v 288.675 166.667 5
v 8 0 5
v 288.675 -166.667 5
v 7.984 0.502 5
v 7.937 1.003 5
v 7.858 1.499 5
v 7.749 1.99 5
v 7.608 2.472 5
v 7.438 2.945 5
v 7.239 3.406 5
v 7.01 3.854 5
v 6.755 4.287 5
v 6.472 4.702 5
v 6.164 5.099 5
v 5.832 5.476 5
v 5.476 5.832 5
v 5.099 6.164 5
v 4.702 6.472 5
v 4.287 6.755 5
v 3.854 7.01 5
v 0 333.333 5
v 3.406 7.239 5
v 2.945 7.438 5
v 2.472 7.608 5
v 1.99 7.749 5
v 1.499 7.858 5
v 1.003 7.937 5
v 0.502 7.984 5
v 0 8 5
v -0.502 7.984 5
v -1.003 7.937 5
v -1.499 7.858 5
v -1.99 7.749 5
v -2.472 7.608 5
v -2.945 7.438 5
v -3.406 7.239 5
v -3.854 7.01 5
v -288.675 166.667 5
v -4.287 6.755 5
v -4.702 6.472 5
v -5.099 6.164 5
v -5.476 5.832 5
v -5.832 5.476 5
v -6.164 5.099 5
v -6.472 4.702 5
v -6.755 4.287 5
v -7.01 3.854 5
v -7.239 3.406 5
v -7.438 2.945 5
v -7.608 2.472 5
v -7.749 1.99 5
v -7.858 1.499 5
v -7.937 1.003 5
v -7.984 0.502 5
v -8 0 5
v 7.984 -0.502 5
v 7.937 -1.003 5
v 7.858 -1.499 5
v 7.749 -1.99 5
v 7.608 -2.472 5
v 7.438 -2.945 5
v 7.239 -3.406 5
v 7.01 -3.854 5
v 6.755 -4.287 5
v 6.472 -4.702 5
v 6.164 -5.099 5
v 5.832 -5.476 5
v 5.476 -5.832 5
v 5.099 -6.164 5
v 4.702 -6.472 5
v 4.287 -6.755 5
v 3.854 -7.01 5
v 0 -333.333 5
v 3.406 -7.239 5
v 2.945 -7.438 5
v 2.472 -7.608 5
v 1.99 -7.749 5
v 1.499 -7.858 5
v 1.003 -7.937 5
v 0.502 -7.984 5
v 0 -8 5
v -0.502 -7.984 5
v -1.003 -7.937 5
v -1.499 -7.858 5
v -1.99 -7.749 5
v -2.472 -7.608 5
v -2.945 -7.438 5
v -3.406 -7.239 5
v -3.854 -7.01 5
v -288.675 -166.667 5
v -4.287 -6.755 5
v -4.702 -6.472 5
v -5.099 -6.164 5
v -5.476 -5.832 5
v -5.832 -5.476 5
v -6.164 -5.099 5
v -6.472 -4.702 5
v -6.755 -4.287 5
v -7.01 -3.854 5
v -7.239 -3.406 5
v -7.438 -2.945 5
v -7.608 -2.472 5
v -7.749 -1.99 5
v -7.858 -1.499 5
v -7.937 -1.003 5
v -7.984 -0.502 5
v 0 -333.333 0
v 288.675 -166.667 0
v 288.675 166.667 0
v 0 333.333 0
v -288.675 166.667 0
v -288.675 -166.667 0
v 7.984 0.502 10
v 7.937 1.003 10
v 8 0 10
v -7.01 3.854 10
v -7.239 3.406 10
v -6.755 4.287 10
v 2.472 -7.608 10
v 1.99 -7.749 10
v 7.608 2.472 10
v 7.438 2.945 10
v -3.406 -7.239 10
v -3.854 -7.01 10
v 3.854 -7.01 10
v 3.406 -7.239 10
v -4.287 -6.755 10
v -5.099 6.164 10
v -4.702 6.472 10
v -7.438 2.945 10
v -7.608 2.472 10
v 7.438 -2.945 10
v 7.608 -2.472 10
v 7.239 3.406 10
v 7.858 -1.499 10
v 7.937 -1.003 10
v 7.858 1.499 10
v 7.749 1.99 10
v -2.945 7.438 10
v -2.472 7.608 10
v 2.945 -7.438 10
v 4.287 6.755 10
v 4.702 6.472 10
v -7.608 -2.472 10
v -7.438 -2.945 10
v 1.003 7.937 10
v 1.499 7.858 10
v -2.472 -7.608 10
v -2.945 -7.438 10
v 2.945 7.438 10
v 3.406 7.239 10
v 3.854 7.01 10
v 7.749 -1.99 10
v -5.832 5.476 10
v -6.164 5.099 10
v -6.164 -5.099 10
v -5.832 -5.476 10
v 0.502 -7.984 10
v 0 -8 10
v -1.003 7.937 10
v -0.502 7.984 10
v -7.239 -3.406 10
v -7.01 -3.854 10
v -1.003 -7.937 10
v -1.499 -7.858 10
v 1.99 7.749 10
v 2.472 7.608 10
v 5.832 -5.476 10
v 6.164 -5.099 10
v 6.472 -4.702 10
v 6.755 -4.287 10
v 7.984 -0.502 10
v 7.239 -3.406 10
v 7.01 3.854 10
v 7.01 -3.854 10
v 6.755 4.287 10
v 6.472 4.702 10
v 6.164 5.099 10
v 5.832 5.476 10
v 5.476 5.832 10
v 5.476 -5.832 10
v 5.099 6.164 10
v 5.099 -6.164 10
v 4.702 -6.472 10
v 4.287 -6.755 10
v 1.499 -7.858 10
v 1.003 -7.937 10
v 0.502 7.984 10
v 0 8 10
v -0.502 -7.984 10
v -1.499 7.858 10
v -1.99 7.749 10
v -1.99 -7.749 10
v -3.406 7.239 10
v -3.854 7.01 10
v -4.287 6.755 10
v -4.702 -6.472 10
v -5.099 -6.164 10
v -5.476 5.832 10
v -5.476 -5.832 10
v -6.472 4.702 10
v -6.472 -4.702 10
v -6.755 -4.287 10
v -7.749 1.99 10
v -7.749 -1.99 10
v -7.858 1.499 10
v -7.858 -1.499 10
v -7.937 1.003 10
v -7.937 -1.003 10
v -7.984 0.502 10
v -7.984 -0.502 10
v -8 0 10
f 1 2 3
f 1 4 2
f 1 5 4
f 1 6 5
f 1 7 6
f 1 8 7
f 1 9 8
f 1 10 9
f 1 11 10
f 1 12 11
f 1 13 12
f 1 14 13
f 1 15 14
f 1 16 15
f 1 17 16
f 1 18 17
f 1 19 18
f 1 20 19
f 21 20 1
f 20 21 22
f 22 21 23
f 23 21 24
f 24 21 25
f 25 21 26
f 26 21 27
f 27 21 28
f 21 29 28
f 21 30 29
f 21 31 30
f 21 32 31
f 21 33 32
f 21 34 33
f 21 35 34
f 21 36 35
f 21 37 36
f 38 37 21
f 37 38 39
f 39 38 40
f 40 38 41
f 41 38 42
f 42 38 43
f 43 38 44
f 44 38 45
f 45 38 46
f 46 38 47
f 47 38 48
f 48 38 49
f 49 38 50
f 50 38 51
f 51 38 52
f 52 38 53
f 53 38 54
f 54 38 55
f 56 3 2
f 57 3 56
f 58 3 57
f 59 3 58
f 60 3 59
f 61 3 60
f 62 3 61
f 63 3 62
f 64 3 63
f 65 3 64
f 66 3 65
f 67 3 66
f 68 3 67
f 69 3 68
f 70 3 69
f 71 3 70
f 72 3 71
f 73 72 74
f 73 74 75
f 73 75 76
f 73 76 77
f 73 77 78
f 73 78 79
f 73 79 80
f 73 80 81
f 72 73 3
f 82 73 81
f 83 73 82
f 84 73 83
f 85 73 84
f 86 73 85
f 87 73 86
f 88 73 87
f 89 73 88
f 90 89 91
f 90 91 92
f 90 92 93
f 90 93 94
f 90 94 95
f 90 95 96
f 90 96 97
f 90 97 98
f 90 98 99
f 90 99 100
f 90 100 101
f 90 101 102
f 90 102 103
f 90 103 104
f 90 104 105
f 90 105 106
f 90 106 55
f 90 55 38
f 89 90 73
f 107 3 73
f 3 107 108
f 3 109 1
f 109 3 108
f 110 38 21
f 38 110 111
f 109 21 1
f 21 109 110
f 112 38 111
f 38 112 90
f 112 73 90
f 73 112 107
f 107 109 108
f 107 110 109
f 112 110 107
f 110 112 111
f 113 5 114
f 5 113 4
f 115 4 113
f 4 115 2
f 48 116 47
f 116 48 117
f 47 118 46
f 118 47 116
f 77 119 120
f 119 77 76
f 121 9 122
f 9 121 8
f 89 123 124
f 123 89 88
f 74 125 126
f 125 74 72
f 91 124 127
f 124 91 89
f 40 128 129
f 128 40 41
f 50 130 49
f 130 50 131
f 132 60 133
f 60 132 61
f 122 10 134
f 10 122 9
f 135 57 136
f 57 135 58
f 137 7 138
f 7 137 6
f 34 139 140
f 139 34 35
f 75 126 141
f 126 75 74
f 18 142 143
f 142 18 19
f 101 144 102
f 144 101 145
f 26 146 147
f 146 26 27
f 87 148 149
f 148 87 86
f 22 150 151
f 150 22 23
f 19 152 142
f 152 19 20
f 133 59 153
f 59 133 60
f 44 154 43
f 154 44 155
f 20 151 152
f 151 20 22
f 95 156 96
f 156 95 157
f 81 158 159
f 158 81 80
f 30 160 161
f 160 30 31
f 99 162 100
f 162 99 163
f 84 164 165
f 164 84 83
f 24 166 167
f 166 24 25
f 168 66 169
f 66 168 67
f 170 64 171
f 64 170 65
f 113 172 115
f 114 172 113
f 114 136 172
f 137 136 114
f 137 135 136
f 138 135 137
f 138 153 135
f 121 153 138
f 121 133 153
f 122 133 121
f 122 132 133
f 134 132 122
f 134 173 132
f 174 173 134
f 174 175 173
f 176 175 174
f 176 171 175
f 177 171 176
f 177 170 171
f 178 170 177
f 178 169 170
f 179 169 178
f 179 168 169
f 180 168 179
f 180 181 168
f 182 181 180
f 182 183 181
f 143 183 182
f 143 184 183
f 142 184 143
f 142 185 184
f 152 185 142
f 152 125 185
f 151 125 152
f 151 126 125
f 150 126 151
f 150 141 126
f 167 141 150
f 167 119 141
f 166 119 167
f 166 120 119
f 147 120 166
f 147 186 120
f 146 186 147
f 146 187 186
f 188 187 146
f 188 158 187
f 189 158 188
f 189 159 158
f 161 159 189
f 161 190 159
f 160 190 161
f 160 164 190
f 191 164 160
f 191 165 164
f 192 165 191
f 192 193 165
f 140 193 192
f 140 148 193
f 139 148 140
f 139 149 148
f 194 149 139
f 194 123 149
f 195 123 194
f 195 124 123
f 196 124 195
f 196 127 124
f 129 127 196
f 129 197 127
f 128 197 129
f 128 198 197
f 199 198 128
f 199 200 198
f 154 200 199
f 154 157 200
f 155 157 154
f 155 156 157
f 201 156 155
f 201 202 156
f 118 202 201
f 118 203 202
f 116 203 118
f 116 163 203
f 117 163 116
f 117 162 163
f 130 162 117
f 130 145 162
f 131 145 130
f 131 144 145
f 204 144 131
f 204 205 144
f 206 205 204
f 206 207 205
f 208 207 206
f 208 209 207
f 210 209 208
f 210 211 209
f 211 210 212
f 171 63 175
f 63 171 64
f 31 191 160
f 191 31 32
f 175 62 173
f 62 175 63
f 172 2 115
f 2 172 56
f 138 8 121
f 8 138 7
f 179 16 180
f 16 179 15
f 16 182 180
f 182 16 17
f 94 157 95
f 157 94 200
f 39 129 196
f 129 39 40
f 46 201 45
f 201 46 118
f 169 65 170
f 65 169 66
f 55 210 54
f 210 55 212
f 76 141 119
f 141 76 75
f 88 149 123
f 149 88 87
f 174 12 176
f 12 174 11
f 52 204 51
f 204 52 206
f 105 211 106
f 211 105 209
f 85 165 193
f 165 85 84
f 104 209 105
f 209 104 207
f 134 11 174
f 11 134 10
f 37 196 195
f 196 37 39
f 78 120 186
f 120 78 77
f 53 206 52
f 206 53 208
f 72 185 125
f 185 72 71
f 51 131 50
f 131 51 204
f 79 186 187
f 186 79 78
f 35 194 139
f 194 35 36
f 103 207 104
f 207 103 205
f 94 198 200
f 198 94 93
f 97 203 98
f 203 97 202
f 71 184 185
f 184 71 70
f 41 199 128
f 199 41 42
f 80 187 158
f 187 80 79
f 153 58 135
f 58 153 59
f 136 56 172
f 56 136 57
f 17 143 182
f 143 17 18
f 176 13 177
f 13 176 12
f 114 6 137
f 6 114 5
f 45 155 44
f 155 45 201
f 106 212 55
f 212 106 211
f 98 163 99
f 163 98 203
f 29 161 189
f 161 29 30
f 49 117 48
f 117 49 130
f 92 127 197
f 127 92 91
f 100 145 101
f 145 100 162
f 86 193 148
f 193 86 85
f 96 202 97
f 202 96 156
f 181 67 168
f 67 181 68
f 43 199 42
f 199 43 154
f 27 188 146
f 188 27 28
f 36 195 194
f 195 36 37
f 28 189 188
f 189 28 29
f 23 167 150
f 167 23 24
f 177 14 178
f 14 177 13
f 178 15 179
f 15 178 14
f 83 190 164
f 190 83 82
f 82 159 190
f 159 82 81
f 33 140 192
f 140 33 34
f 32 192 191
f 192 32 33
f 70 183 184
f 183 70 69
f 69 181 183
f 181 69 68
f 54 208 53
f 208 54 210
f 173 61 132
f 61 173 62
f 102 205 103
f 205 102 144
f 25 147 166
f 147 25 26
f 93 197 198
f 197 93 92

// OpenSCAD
// everything has to be a factor of 0.4m

stroke = 2;
notch_width = 20.5;
notch_depth = 1;
distance_apart = 33 + 1/3;
wall_depth = 20;
triangle_height = (distance_apart * sqrt(3)) / 2;
num_rings = 10;
radius = distance_apart * num_rings;


diffuser_thickness = 0.4;


standoff_distance_from_edge = 2;

standoff_height = 5;
standoff_radius = 2;
standoff_length = 5; // this is how far out the standoff is from the backplate_chin

countersink_radius = 8;
countersink_depth = 2;

backplate_thickness = 5;


fudge = 1;

//diffuser();
//honeycomb();
//backplate_honeycomb();
backplate_chin();

module honeycomb()
{
    
    difference()
    {
        rotate(30) cylinder(h=wall_depth, r=radius /*+ stroke / 2*/, $fn=6);
    
    for (i = [num_rings / 2 - 1:-1:(-2 * num_rings) + (num_rings / 2)]) // draws the square
        {
            orgin = [triangle_height * -10, distance_apart * i  + (triangle_height - notch_width) / 2, wall_depth - notch_depth];
                                                                           //the + 1 is needed to finish the etch
            translate(orgin) rotate(30)cube([distance_apart * (num_rings * 2 + 1), notch_width, notch_depth + fudge]); 
        }
    
        for (y = [num_rings:-1:-num_rings]) 
        {
            for (x = [-num_rings:2:num_rings])
            {          
                translate([x * triangle_height + (triangle_height * (2/3)), y * distance_apart, -2]) rotate(60) cylinder (h=wall_depth+4, r=(triangle_height* 2/3) - stroke, $fn=3);
                translate([x * triangle_height - (triangle_height * (2/3)), y * distance_apart, -2]) rotate(0) cylinder (h= wall_depth+4, r=(triangle_height* 2/3) - stroke, $fn=3);
            
                translate([(x+1) * triangle_height + (triangle_height * (2/3)), (y) * distance_apart + distance_apart / 2, -2]) rotate(60) cylinder (h=wall_depth+4, r=(triangle_height* 2/3) - stroke, $fn=3);
                translate([(x+1) * triangle_height - (triangle_height * (2/3)), (y) * distance_apart + distance_apart / 2, -2]) rotate(0) cylinder (h=wall_depth+4, r=(triangle_height* 2/3) - stroke, $fn=3);        
            }
        }

        //trimming for print
        /* 
        translate([0,0,-5]) rotate(60) cube([1000,1000,100]);
        translate([0,0,-5]) rotate(120) cube([1000,1000,100]);
        translate([0,0,-5]) rotate(180) cube([1000,1000,100]);
        translate([0,0,-5]) rotate(-0) cube([1000,1000,100]);
        translate([0,0,-5]) rotate(-30) cube([1000,1000,100]);
        translate([0,-7 * distance_apart,-1]) rotate(30) cube([1000,1000,100]);
        translate([0,-6 * distance_apart,-1]) rotate(-30) cube([1000,1000,100]); 
        */
    }
}

module diffuser() difference() //union()
{
    
    translate([0,0,-diffuser_thickness])rotate(30) cylinder(h=diffuser_thickness, r=radius /* + stroke / 2 */, $fn=6);
    /*
    translate([0,0,-5]) rotate(60) cube([1000,1000,100]);
    translate([0,0,-5]) rotate(120) cube([1000,1000,100]);
    translate([0,0,-5]) rotate(180) cube([1000,1000,100]);
    translate([0,0,-5]) rotate(-0) cube([1000,1000,100]);
    translate([0,0,-5]) rotate(-30) cube([1000,1000,100]);
    translate([0,-7 * distance_apart,-1]) rotate(30) cube([1000,1000,100]);
    translate([0,-6 * distance_apart,-1]) rotate(-30) cube([1000,1000,100]); 
    */    
}

module backplate_honeycomb()
{
    // draw the backplate
    translate([0, 0, wall_depth + standoff_height]) rotate(30) cylinder(h=backplate_thickness, r=radius /*+ stroke / 2*/, $fn=6);
    
    
    
}


module backplate_chin() 
{
    rotate(30) cylinder(h=backplate_thickness, r=radius /*+ stroke / 2*/, $fn=6);
    
    
    // make the standoffs
    union() 
    {
    // center
    translate([0, 0, backplate_thickness]) cylinder(h=standoff_length, r=countersink_radius, $fn=100);
    }
    
    
    
    difference()
    {
    // drill the holes for the screws and the countersinks
    
    // top center
    translate([0, distance_apart * (num_rings - standoff_distance_from_edge), 0]) cylinder(h=standoff_height, r=standoff_radius, $fn=100);
    
    translate([0, distance_apart * (num_rings - standoff_distance_from_edge), 0]) cylinder(h=countersink_depth, r=countersink_radius, $fn=100);
    
    // top right
    translate([triangle_height * (num_rings - standoff_distance_from_edge), distance_apart * num_rings / 2, 0]) cylinder(h=standoff_height, r=standoff_radius, $fn=100);
    
    translate([triangle_height * (num_rings - standoff_distance_from_edge), distance_apart * num_rings / 2, 0]) cylinder(h=countersink_depth, r=countersink_radius, $fn=100);
    
    // bottom right
    translate([triangle_height * (num_rings - standoff_distance_from_edge), -distance_apart * num_rings / 2, 0]) cylinder(h=standoff_height, r=standoff_radius, $fn=100);
    
    translate([triangle_height * (num_rings - standoff_distance_from_edge), -distance_apart * num_rings / 2, 0]) cylinder(h=countersink_depth, r=countersink_radius, $fn=100);

    // bottom center
    translate([0, -distance_apart * (num_rings - standoff_distance_from_edge), 0]) cylinder(h=standoff_height, r=standoff_radius, $fn=100);
    
    translate([0, -distance_apart * (num_rings - standoff_distance_from_edge), 0]) cylinder(h=countersink_depth, r=countersink_radius, $fn=100);
    
    // bottom left
    translate([-triangle_height * (num_rings - standoff_distance_from_edge), -distance_apart * num_rings / 2, 0]) cylinder(h=standoff_height, r=standoff_radius, $fn=100);
    
    translate([-triangle_height * (num_rings - standoff_distance_from_edge), -distance_apart * num_rings / 2, 0]) cylinder(h=countersink_depth, r=countersink_radius, $fn=100);
    
    // top left
    translate([-triangle_height * (num_rings - standoff_distance_from_edge), distance_apart * num_rings / 2, 0]) cylinder(h=standoff_height, r=standoff_radius, $fn=100);
    
    translate([-triangle_height * (num_rings - standoff_distance_from_edge), distance_apart * num_rings / 2, 0]) cylinder(h=countersink_depth, r=countersink_radius, $fn=100);
    
    // center
    translate([0, 0, 0]) cylinder(h=countersink_depth, r=countersink_radius, $fn=100);
}
}
